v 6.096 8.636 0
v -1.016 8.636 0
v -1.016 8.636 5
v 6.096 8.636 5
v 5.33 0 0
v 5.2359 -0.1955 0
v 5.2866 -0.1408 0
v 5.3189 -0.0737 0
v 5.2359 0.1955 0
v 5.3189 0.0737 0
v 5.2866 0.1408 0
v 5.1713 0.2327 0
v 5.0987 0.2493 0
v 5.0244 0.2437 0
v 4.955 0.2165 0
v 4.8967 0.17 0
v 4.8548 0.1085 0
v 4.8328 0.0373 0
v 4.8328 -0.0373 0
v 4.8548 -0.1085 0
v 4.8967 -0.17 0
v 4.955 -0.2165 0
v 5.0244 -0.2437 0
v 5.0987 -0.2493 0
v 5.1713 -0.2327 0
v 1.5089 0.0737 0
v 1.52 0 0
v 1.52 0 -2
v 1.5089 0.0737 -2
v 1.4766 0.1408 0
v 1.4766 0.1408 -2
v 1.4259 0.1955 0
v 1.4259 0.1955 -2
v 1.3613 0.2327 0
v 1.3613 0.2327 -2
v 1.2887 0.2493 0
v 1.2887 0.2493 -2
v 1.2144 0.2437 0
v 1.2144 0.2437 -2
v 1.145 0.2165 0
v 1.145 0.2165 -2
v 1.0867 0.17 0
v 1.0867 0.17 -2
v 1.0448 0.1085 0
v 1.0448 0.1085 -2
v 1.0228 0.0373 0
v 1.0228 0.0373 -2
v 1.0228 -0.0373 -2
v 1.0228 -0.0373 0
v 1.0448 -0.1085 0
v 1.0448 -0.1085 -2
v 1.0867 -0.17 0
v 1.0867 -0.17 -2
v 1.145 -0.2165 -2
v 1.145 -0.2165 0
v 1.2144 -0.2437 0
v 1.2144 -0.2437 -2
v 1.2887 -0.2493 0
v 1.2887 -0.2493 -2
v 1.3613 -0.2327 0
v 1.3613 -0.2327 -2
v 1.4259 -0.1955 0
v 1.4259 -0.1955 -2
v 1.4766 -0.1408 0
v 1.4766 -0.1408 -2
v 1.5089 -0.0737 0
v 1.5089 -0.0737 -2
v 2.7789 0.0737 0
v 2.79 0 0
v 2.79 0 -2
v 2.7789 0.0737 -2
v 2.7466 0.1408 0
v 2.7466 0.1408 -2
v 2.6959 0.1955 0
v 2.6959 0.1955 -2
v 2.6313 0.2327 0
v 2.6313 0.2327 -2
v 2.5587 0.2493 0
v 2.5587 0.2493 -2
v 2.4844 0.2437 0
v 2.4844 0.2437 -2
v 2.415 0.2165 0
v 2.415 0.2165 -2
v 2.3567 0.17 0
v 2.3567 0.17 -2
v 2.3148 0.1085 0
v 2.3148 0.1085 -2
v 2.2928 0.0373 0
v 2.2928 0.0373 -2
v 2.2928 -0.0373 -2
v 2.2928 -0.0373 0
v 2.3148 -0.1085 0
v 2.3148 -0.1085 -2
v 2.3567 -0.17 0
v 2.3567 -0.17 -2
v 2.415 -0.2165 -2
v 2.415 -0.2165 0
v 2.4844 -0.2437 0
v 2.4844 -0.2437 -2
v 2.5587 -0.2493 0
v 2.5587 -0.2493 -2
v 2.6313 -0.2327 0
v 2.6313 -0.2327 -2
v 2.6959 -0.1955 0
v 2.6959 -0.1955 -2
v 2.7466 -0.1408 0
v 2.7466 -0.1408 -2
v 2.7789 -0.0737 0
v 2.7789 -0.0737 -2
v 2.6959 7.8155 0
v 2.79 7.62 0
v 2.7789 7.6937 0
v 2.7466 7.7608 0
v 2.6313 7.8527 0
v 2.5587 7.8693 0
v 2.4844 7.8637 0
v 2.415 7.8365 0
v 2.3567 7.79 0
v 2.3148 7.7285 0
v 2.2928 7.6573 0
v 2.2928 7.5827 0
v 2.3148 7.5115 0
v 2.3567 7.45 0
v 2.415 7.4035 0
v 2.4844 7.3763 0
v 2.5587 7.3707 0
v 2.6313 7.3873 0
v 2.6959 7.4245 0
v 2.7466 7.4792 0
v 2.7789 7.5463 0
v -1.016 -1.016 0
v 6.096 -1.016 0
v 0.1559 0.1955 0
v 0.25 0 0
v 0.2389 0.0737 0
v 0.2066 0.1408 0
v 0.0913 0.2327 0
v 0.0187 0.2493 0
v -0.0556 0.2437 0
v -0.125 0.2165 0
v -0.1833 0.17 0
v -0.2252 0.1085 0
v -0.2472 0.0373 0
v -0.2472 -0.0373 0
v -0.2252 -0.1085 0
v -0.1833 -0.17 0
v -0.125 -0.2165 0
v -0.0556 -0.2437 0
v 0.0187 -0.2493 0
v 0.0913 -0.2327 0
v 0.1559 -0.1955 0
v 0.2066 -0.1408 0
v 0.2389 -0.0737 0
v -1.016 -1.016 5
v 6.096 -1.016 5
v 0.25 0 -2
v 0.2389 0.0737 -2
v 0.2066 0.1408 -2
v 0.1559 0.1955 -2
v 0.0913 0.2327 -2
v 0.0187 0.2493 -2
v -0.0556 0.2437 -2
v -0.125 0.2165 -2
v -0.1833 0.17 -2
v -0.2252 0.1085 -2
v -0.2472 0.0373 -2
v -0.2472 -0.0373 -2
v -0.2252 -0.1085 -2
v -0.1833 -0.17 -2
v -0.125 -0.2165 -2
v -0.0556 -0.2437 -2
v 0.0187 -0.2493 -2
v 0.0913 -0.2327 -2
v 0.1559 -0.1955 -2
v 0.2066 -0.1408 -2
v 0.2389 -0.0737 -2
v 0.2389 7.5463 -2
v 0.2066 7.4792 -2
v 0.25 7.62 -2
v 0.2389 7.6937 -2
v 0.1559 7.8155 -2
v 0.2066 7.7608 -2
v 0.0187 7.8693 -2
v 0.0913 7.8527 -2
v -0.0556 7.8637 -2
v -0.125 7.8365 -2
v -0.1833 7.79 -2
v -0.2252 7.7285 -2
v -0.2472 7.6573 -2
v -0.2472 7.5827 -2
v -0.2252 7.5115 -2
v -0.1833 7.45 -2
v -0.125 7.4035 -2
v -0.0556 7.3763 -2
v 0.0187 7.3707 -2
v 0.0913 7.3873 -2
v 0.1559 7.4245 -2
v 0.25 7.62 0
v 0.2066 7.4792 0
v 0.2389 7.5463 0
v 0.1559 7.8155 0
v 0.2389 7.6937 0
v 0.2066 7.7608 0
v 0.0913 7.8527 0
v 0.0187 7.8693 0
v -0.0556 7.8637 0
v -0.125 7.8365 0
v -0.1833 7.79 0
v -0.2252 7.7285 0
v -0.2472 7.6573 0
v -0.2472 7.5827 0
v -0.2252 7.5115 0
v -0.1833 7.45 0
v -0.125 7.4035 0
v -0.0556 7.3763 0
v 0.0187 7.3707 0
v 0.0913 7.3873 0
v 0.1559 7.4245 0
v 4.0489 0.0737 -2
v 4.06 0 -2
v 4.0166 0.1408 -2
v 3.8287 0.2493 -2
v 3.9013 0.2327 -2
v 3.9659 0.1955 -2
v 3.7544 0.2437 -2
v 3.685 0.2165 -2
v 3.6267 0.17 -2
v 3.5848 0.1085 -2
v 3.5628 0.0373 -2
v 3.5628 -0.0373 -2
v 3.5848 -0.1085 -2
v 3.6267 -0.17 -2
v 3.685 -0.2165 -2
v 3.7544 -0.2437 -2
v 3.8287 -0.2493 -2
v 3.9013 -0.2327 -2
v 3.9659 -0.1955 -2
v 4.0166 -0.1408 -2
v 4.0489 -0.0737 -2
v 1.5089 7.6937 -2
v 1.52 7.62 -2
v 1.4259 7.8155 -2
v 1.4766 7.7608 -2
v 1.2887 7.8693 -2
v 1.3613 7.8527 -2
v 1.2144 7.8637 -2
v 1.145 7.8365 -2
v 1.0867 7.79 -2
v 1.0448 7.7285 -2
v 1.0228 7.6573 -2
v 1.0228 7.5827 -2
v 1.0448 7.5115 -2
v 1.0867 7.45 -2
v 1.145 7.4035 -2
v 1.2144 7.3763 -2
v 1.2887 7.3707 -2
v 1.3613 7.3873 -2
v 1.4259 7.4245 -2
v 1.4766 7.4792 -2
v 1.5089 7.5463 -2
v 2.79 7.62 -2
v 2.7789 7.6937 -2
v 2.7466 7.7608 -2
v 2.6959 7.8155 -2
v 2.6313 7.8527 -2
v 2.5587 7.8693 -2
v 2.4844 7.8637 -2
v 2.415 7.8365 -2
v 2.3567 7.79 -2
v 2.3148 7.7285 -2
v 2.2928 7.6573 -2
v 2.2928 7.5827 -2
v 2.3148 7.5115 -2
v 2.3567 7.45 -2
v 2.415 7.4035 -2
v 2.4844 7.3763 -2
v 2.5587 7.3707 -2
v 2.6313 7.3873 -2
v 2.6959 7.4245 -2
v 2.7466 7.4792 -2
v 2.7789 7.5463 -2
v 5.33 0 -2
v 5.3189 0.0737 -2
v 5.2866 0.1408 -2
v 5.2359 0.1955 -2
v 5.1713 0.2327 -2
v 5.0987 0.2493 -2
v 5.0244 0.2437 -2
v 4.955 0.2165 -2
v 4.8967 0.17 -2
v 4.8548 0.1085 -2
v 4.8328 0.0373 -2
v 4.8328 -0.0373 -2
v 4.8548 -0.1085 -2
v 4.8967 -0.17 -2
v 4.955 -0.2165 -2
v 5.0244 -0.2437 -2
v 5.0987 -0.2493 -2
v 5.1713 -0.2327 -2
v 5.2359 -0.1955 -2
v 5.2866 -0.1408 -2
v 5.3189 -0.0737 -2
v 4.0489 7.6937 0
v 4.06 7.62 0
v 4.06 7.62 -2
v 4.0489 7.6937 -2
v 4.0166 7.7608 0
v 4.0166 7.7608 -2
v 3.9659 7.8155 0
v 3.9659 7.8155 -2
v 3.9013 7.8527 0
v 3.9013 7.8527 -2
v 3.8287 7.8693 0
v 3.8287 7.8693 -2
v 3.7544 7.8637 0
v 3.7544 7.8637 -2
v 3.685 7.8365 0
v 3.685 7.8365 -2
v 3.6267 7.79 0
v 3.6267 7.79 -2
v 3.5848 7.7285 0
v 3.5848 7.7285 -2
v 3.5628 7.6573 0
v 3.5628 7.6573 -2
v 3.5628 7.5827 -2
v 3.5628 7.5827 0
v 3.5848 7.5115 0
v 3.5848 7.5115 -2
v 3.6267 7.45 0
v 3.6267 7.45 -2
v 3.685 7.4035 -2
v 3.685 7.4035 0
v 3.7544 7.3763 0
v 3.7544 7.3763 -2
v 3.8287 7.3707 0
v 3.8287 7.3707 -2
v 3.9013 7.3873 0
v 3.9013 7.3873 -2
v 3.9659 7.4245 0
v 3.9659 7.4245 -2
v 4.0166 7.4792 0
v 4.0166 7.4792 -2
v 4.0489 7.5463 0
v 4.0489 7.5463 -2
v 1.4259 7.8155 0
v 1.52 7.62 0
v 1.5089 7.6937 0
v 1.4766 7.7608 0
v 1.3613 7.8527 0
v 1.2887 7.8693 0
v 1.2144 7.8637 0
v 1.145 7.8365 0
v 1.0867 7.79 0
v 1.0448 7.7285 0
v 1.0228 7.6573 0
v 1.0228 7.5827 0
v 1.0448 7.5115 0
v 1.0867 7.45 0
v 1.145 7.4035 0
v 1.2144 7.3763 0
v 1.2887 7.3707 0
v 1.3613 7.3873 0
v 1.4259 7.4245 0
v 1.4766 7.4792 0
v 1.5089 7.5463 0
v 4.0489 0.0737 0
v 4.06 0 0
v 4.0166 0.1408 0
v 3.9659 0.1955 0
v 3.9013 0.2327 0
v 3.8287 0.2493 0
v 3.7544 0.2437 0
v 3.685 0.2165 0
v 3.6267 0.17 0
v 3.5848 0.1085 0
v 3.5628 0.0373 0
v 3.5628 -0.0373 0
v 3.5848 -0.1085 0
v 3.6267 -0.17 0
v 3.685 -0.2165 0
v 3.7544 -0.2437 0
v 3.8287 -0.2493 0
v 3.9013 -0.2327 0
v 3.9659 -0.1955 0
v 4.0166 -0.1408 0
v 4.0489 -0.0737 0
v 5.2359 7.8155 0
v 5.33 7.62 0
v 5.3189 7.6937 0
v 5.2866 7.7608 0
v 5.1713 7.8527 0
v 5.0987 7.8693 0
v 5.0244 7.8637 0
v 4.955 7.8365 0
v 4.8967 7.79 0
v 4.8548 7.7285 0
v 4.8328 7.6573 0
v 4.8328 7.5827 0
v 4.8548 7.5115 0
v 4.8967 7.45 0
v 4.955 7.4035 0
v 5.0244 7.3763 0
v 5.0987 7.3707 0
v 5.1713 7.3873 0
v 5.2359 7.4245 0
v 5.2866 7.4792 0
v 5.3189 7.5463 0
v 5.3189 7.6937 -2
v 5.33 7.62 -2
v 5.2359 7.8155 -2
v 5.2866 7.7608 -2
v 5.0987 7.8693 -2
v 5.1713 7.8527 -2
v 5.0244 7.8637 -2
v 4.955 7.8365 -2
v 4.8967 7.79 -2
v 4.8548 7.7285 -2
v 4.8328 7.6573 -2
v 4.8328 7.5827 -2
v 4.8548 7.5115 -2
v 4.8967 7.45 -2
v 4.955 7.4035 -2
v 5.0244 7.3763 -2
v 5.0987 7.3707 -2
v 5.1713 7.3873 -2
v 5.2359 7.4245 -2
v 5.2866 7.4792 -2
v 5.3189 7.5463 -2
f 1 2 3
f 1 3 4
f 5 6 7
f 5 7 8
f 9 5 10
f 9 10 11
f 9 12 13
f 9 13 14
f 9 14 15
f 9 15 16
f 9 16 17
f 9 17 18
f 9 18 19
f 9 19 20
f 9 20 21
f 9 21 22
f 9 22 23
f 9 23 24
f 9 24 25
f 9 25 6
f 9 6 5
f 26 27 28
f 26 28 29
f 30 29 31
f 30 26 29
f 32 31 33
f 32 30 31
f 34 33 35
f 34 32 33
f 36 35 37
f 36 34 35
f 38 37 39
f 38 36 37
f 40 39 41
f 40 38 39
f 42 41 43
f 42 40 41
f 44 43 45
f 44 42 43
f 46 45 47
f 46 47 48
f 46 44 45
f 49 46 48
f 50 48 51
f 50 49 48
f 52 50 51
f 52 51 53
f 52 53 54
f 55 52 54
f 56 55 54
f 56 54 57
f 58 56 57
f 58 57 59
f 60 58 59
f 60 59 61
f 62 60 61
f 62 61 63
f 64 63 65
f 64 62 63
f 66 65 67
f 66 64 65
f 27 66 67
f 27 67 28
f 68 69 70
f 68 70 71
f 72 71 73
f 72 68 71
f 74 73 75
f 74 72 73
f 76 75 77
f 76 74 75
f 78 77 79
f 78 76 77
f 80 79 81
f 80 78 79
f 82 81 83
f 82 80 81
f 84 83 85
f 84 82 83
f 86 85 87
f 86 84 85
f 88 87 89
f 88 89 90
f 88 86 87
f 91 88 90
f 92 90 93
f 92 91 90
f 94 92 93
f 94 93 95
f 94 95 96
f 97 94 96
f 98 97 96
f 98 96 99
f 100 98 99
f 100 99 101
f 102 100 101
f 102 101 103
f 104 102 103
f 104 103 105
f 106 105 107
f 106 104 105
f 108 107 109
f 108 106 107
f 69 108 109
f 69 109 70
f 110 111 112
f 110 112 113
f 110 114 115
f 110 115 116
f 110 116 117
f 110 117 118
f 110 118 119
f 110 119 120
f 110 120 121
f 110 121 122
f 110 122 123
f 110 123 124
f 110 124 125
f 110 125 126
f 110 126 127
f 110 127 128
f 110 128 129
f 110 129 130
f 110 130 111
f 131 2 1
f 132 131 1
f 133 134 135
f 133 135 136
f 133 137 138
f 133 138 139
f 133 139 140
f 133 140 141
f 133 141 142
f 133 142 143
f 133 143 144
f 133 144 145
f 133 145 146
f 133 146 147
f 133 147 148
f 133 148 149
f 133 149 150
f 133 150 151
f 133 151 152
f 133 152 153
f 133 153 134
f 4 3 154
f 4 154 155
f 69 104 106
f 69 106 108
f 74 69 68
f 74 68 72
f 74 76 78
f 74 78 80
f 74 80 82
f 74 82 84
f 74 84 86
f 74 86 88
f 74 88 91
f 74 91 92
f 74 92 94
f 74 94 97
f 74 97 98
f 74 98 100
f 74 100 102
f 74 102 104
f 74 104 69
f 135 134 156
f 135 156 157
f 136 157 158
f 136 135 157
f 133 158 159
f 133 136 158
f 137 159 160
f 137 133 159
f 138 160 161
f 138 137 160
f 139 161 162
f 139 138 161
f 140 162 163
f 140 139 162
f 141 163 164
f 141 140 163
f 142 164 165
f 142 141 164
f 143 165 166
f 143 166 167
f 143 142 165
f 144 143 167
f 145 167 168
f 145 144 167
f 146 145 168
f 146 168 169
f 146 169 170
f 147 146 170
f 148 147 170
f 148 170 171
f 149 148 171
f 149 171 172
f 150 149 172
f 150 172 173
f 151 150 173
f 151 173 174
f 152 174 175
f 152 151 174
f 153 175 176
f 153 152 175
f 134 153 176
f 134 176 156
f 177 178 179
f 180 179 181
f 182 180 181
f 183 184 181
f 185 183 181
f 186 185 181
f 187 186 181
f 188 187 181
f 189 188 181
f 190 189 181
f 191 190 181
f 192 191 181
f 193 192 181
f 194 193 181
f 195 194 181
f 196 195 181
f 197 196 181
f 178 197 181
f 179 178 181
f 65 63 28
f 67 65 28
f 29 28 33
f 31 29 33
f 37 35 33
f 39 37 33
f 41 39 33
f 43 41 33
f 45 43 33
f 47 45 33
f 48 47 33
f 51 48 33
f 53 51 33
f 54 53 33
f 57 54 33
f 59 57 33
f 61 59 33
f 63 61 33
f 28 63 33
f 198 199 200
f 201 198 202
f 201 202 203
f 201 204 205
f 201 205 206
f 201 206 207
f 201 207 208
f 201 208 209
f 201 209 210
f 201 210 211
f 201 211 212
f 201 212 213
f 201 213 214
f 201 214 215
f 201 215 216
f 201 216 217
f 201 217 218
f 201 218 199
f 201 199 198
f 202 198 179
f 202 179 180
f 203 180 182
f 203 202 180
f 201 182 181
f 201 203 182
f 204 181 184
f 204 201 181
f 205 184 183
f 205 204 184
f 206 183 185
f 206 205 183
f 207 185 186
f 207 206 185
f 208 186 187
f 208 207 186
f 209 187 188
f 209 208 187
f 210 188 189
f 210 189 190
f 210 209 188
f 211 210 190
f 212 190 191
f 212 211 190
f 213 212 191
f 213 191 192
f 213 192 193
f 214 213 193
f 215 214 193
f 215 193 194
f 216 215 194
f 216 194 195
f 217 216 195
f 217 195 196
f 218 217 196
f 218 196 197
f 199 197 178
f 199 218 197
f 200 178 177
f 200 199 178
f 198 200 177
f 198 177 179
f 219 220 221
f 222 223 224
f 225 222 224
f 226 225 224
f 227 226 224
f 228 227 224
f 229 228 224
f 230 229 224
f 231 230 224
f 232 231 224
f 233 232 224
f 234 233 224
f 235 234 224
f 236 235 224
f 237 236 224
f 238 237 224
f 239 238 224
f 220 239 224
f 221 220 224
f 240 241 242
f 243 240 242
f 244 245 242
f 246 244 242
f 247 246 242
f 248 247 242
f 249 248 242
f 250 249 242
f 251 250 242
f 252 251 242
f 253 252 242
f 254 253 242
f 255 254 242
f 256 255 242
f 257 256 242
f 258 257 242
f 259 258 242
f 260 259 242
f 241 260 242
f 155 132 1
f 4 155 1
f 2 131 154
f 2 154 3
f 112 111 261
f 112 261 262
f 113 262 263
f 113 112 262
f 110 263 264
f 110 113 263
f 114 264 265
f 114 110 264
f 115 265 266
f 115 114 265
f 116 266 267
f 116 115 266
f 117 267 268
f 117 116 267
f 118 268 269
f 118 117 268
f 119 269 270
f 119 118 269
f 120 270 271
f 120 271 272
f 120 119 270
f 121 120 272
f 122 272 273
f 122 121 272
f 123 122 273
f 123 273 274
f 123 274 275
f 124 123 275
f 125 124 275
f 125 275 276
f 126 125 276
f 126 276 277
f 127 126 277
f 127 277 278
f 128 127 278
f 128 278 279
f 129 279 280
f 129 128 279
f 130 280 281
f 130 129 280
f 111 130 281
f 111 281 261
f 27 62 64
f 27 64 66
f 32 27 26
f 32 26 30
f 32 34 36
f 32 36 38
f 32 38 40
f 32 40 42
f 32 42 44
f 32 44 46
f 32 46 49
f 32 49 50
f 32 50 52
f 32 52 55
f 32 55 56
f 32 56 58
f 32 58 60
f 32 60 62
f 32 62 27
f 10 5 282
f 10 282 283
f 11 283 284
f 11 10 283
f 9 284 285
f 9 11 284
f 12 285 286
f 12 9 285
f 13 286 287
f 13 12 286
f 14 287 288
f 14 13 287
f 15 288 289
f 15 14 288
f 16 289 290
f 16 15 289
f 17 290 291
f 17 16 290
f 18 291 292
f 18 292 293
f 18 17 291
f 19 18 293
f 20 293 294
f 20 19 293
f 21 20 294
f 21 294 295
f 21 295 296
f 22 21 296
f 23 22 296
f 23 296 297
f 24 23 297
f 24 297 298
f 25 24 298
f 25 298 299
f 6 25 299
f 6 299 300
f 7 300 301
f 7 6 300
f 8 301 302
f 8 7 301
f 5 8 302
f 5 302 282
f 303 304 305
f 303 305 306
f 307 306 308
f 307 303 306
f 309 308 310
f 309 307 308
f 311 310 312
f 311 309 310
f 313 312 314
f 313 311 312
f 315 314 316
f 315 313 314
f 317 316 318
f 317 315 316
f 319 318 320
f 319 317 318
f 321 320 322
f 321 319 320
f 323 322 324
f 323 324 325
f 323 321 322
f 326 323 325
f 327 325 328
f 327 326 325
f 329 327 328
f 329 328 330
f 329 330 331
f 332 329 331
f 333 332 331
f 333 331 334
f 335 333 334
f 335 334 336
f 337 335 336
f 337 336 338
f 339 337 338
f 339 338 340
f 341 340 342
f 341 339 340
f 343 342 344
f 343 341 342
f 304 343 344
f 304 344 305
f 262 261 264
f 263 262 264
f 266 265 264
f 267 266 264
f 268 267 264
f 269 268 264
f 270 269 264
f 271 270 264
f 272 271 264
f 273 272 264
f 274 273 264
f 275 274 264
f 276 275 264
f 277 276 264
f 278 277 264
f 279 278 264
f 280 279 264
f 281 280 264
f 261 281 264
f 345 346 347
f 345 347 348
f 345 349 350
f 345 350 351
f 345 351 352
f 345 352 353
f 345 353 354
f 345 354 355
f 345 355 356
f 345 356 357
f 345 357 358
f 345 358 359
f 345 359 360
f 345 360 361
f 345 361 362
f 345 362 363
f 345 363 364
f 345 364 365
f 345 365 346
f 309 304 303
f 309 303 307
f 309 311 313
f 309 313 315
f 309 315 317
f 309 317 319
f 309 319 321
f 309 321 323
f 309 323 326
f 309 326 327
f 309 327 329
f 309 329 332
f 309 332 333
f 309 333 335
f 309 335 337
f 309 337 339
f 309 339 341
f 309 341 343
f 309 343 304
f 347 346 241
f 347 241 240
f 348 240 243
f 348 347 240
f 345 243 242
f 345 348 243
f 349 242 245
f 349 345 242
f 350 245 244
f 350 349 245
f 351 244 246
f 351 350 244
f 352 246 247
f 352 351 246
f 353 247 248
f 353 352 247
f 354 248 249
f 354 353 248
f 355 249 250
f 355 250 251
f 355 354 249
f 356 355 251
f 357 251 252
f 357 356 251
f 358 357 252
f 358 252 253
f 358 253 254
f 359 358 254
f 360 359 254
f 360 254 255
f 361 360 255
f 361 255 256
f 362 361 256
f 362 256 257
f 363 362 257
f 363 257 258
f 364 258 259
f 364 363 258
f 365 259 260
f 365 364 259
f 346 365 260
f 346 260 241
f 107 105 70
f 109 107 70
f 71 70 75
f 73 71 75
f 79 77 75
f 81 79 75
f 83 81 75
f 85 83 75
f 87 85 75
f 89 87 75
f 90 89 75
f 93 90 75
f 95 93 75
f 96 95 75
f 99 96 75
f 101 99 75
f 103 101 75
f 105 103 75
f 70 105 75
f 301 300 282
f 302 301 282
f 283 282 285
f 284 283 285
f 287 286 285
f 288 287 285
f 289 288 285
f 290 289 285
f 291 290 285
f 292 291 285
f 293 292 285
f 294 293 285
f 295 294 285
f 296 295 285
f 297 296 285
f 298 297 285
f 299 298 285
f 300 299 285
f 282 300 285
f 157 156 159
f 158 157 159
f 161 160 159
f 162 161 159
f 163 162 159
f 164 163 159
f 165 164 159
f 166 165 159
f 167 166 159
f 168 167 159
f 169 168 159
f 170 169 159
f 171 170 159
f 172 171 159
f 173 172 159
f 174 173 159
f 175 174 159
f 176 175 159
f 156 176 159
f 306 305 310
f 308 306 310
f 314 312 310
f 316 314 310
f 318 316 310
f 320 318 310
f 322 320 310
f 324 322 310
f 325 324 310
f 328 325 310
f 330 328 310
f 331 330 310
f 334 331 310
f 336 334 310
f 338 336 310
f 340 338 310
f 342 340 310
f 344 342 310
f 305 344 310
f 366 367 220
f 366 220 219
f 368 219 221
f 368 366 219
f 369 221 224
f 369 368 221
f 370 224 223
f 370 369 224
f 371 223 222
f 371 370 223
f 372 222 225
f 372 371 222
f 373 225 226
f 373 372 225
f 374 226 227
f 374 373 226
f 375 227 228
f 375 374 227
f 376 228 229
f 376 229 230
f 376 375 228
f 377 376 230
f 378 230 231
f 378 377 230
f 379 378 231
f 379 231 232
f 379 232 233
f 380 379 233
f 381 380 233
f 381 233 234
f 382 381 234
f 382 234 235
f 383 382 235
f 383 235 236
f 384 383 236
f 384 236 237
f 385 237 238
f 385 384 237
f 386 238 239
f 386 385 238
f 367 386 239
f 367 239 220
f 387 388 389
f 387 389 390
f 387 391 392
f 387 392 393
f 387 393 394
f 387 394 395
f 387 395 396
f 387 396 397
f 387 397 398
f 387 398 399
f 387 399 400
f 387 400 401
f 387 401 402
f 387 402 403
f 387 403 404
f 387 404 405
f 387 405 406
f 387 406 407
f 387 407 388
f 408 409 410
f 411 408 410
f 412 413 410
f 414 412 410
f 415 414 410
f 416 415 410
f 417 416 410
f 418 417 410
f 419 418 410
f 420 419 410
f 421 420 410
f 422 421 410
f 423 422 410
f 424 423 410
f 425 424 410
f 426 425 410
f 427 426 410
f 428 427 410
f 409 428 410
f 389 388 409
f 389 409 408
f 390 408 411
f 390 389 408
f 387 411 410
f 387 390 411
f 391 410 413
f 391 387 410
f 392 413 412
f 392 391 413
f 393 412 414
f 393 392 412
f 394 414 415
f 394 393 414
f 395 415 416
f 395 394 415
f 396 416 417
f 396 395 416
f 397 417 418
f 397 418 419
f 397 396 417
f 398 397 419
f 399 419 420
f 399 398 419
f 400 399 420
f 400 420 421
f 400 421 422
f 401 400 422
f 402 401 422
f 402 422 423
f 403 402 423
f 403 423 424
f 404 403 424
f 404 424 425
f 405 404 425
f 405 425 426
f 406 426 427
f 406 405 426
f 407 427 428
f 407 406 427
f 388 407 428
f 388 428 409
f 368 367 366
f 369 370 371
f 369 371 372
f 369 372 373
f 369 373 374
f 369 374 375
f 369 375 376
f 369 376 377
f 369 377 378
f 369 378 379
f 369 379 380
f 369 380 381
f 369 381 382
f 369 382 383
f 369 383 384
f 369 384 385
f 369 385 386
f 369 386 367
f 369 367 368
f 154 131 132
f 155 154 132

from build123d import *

# Parameters (mm, degrees)
SKETCH1_W               = 7.112
SKETCH1_H               = 9.652
COMPONENT_OUTLINE_DEPTH = 5
SKETCH2_R               = 0.25
EXTRUDE_1_DEPTH         = 2
SKETCH3_R               = 0.25
EXTRUDE_2_DEPTH         = 2
SKETCH4_R               = 0.25
EXTRUDE_3_DEPTH         = 2
SKETCH5_R               = 0.25
EXTRUDE_4_DEPTH         = 2
SKETCH6_R               = 0.25
EXTRUDE_5_DEPTH         = 2
SKETCH7_R               = 0.25
EXTRUDE_6_DEPTH         = 2
SKETCH8_R               = 0.25
EXTRUDE_7_DEPTH         = 2
SKETCH9_R               = 0.25
EXTRUDE_8_DEPTH         = 2
SKETCH10_R              = 0.25
EXTRUDE_9_DEPTH         = 2
SKETCH11_R              = 0.25
EXTRUDE_10_DEPTH        = 2


with BuildPart() as part:
    # Sketch1 → Component_Outline (new body)
    with BuildSketch(Plane.XY):
        with Locations((2.54, 3.81)):
            Rectangle(SKETCH1_W, SKETCH1_H)
    extrude(amount=COMPONENT_OUTLINE_DEPTH)


with BuildPart() as body_2:
    # Sketch2 → Extrude 1 (new body)
    with BuildSketch(Plane.XY):
        Circle(SKETCH2_R)
    extrude(amount=-EXTRUDE_1_DEPTH)


with BuildPart() as body_3:
    # Sketch3 → Extrude 2 (new body)
    with BuildSketch(Plane.XY):
        with Locations((1.27, 0)):
            Circle(SKETCH3_R)
    extrude(amount=-EXTRUDE_2_DEPTH)


with BuildPart() as body_4:
    # Sketch4 → Extrude 3 (new body)
    with BuildSketch(Plane.XY):
        with Locations((2.54, 0)):
            Circle(SKETCH4_R)
    extrude(amount=-EXTRUDE_3_DEPTH)


with BuildPart() as body_5:
    # Sketch5 → Extrude 4 (new body)
    with BuildSketch(Plane.XY):
        with Locations((3.81, 0)):
            Circle(SKETCH5_R)
    extrude(amount=-EXTRUDE_4_DEPTH)


with BuildPart() as body_6:
    # Sketch6 → Extrude 5 (new body)
    with BuildSketch(Plane.XY):
        with Locations((5.08, 0)):
            Circle(SKETCH6_R)
    extrude(amount=-EXTRUDE_5_DEPTH)


with BuildPart() as body_7:
    # Sketch7 → Extrude 6 (new body)
    with BuildSketch(Plane.XY):
        with Locations((5.08, 7.62)):
            Circle(SKETCH7_R)
    extrude(amount=-EXTRUDE_6_DEPTH)


with BuildPart() as body_8:
    # Sketch8 → Extrude 7 (new body)
    with BuildSketch(Plane.XY):
        with Locations((3.81, 7.62)):
            Circle(SKETCH8_R)
    extrude(amount=-EXTRUDE_7_DEPTH)


with BuildPart() as body_9:
    # Sketch9 → Extrude 8 (new body)
    with BuildSketch(Plane.XY):
        with Locations((2.54, 7.62)):
            Circle(SKETCH9_R)
    extrude(amount=-EXTRUDE_8_DEPTH)


with BuildPart() as body_10:
    # Sketch10 → Extrude 9 (new body)
    with BuildSketch(Plane.XY):
        with Locations((1.27, 7.62)):
            Circle(SKETCH10_R)
    extrude(amount=-EXTRUDE_9_DEPTH)


with BuildPart() as body_11:
    # Sketch11 → Extrude 10 (new body)
    with BuildSketch(Plane.XY):
        with Locations((0, 7.62)):
            Circle(SKETCH11_R)
    extrude(amount=-EXTRUDE_10_DEPTH)


solid = Compound([part.part, body_2.part, body_3.part, body_4.part, body_5.part, body_6.part, body_7.part, body_8.part, body_9.part, body_10.part, body_11.part])
